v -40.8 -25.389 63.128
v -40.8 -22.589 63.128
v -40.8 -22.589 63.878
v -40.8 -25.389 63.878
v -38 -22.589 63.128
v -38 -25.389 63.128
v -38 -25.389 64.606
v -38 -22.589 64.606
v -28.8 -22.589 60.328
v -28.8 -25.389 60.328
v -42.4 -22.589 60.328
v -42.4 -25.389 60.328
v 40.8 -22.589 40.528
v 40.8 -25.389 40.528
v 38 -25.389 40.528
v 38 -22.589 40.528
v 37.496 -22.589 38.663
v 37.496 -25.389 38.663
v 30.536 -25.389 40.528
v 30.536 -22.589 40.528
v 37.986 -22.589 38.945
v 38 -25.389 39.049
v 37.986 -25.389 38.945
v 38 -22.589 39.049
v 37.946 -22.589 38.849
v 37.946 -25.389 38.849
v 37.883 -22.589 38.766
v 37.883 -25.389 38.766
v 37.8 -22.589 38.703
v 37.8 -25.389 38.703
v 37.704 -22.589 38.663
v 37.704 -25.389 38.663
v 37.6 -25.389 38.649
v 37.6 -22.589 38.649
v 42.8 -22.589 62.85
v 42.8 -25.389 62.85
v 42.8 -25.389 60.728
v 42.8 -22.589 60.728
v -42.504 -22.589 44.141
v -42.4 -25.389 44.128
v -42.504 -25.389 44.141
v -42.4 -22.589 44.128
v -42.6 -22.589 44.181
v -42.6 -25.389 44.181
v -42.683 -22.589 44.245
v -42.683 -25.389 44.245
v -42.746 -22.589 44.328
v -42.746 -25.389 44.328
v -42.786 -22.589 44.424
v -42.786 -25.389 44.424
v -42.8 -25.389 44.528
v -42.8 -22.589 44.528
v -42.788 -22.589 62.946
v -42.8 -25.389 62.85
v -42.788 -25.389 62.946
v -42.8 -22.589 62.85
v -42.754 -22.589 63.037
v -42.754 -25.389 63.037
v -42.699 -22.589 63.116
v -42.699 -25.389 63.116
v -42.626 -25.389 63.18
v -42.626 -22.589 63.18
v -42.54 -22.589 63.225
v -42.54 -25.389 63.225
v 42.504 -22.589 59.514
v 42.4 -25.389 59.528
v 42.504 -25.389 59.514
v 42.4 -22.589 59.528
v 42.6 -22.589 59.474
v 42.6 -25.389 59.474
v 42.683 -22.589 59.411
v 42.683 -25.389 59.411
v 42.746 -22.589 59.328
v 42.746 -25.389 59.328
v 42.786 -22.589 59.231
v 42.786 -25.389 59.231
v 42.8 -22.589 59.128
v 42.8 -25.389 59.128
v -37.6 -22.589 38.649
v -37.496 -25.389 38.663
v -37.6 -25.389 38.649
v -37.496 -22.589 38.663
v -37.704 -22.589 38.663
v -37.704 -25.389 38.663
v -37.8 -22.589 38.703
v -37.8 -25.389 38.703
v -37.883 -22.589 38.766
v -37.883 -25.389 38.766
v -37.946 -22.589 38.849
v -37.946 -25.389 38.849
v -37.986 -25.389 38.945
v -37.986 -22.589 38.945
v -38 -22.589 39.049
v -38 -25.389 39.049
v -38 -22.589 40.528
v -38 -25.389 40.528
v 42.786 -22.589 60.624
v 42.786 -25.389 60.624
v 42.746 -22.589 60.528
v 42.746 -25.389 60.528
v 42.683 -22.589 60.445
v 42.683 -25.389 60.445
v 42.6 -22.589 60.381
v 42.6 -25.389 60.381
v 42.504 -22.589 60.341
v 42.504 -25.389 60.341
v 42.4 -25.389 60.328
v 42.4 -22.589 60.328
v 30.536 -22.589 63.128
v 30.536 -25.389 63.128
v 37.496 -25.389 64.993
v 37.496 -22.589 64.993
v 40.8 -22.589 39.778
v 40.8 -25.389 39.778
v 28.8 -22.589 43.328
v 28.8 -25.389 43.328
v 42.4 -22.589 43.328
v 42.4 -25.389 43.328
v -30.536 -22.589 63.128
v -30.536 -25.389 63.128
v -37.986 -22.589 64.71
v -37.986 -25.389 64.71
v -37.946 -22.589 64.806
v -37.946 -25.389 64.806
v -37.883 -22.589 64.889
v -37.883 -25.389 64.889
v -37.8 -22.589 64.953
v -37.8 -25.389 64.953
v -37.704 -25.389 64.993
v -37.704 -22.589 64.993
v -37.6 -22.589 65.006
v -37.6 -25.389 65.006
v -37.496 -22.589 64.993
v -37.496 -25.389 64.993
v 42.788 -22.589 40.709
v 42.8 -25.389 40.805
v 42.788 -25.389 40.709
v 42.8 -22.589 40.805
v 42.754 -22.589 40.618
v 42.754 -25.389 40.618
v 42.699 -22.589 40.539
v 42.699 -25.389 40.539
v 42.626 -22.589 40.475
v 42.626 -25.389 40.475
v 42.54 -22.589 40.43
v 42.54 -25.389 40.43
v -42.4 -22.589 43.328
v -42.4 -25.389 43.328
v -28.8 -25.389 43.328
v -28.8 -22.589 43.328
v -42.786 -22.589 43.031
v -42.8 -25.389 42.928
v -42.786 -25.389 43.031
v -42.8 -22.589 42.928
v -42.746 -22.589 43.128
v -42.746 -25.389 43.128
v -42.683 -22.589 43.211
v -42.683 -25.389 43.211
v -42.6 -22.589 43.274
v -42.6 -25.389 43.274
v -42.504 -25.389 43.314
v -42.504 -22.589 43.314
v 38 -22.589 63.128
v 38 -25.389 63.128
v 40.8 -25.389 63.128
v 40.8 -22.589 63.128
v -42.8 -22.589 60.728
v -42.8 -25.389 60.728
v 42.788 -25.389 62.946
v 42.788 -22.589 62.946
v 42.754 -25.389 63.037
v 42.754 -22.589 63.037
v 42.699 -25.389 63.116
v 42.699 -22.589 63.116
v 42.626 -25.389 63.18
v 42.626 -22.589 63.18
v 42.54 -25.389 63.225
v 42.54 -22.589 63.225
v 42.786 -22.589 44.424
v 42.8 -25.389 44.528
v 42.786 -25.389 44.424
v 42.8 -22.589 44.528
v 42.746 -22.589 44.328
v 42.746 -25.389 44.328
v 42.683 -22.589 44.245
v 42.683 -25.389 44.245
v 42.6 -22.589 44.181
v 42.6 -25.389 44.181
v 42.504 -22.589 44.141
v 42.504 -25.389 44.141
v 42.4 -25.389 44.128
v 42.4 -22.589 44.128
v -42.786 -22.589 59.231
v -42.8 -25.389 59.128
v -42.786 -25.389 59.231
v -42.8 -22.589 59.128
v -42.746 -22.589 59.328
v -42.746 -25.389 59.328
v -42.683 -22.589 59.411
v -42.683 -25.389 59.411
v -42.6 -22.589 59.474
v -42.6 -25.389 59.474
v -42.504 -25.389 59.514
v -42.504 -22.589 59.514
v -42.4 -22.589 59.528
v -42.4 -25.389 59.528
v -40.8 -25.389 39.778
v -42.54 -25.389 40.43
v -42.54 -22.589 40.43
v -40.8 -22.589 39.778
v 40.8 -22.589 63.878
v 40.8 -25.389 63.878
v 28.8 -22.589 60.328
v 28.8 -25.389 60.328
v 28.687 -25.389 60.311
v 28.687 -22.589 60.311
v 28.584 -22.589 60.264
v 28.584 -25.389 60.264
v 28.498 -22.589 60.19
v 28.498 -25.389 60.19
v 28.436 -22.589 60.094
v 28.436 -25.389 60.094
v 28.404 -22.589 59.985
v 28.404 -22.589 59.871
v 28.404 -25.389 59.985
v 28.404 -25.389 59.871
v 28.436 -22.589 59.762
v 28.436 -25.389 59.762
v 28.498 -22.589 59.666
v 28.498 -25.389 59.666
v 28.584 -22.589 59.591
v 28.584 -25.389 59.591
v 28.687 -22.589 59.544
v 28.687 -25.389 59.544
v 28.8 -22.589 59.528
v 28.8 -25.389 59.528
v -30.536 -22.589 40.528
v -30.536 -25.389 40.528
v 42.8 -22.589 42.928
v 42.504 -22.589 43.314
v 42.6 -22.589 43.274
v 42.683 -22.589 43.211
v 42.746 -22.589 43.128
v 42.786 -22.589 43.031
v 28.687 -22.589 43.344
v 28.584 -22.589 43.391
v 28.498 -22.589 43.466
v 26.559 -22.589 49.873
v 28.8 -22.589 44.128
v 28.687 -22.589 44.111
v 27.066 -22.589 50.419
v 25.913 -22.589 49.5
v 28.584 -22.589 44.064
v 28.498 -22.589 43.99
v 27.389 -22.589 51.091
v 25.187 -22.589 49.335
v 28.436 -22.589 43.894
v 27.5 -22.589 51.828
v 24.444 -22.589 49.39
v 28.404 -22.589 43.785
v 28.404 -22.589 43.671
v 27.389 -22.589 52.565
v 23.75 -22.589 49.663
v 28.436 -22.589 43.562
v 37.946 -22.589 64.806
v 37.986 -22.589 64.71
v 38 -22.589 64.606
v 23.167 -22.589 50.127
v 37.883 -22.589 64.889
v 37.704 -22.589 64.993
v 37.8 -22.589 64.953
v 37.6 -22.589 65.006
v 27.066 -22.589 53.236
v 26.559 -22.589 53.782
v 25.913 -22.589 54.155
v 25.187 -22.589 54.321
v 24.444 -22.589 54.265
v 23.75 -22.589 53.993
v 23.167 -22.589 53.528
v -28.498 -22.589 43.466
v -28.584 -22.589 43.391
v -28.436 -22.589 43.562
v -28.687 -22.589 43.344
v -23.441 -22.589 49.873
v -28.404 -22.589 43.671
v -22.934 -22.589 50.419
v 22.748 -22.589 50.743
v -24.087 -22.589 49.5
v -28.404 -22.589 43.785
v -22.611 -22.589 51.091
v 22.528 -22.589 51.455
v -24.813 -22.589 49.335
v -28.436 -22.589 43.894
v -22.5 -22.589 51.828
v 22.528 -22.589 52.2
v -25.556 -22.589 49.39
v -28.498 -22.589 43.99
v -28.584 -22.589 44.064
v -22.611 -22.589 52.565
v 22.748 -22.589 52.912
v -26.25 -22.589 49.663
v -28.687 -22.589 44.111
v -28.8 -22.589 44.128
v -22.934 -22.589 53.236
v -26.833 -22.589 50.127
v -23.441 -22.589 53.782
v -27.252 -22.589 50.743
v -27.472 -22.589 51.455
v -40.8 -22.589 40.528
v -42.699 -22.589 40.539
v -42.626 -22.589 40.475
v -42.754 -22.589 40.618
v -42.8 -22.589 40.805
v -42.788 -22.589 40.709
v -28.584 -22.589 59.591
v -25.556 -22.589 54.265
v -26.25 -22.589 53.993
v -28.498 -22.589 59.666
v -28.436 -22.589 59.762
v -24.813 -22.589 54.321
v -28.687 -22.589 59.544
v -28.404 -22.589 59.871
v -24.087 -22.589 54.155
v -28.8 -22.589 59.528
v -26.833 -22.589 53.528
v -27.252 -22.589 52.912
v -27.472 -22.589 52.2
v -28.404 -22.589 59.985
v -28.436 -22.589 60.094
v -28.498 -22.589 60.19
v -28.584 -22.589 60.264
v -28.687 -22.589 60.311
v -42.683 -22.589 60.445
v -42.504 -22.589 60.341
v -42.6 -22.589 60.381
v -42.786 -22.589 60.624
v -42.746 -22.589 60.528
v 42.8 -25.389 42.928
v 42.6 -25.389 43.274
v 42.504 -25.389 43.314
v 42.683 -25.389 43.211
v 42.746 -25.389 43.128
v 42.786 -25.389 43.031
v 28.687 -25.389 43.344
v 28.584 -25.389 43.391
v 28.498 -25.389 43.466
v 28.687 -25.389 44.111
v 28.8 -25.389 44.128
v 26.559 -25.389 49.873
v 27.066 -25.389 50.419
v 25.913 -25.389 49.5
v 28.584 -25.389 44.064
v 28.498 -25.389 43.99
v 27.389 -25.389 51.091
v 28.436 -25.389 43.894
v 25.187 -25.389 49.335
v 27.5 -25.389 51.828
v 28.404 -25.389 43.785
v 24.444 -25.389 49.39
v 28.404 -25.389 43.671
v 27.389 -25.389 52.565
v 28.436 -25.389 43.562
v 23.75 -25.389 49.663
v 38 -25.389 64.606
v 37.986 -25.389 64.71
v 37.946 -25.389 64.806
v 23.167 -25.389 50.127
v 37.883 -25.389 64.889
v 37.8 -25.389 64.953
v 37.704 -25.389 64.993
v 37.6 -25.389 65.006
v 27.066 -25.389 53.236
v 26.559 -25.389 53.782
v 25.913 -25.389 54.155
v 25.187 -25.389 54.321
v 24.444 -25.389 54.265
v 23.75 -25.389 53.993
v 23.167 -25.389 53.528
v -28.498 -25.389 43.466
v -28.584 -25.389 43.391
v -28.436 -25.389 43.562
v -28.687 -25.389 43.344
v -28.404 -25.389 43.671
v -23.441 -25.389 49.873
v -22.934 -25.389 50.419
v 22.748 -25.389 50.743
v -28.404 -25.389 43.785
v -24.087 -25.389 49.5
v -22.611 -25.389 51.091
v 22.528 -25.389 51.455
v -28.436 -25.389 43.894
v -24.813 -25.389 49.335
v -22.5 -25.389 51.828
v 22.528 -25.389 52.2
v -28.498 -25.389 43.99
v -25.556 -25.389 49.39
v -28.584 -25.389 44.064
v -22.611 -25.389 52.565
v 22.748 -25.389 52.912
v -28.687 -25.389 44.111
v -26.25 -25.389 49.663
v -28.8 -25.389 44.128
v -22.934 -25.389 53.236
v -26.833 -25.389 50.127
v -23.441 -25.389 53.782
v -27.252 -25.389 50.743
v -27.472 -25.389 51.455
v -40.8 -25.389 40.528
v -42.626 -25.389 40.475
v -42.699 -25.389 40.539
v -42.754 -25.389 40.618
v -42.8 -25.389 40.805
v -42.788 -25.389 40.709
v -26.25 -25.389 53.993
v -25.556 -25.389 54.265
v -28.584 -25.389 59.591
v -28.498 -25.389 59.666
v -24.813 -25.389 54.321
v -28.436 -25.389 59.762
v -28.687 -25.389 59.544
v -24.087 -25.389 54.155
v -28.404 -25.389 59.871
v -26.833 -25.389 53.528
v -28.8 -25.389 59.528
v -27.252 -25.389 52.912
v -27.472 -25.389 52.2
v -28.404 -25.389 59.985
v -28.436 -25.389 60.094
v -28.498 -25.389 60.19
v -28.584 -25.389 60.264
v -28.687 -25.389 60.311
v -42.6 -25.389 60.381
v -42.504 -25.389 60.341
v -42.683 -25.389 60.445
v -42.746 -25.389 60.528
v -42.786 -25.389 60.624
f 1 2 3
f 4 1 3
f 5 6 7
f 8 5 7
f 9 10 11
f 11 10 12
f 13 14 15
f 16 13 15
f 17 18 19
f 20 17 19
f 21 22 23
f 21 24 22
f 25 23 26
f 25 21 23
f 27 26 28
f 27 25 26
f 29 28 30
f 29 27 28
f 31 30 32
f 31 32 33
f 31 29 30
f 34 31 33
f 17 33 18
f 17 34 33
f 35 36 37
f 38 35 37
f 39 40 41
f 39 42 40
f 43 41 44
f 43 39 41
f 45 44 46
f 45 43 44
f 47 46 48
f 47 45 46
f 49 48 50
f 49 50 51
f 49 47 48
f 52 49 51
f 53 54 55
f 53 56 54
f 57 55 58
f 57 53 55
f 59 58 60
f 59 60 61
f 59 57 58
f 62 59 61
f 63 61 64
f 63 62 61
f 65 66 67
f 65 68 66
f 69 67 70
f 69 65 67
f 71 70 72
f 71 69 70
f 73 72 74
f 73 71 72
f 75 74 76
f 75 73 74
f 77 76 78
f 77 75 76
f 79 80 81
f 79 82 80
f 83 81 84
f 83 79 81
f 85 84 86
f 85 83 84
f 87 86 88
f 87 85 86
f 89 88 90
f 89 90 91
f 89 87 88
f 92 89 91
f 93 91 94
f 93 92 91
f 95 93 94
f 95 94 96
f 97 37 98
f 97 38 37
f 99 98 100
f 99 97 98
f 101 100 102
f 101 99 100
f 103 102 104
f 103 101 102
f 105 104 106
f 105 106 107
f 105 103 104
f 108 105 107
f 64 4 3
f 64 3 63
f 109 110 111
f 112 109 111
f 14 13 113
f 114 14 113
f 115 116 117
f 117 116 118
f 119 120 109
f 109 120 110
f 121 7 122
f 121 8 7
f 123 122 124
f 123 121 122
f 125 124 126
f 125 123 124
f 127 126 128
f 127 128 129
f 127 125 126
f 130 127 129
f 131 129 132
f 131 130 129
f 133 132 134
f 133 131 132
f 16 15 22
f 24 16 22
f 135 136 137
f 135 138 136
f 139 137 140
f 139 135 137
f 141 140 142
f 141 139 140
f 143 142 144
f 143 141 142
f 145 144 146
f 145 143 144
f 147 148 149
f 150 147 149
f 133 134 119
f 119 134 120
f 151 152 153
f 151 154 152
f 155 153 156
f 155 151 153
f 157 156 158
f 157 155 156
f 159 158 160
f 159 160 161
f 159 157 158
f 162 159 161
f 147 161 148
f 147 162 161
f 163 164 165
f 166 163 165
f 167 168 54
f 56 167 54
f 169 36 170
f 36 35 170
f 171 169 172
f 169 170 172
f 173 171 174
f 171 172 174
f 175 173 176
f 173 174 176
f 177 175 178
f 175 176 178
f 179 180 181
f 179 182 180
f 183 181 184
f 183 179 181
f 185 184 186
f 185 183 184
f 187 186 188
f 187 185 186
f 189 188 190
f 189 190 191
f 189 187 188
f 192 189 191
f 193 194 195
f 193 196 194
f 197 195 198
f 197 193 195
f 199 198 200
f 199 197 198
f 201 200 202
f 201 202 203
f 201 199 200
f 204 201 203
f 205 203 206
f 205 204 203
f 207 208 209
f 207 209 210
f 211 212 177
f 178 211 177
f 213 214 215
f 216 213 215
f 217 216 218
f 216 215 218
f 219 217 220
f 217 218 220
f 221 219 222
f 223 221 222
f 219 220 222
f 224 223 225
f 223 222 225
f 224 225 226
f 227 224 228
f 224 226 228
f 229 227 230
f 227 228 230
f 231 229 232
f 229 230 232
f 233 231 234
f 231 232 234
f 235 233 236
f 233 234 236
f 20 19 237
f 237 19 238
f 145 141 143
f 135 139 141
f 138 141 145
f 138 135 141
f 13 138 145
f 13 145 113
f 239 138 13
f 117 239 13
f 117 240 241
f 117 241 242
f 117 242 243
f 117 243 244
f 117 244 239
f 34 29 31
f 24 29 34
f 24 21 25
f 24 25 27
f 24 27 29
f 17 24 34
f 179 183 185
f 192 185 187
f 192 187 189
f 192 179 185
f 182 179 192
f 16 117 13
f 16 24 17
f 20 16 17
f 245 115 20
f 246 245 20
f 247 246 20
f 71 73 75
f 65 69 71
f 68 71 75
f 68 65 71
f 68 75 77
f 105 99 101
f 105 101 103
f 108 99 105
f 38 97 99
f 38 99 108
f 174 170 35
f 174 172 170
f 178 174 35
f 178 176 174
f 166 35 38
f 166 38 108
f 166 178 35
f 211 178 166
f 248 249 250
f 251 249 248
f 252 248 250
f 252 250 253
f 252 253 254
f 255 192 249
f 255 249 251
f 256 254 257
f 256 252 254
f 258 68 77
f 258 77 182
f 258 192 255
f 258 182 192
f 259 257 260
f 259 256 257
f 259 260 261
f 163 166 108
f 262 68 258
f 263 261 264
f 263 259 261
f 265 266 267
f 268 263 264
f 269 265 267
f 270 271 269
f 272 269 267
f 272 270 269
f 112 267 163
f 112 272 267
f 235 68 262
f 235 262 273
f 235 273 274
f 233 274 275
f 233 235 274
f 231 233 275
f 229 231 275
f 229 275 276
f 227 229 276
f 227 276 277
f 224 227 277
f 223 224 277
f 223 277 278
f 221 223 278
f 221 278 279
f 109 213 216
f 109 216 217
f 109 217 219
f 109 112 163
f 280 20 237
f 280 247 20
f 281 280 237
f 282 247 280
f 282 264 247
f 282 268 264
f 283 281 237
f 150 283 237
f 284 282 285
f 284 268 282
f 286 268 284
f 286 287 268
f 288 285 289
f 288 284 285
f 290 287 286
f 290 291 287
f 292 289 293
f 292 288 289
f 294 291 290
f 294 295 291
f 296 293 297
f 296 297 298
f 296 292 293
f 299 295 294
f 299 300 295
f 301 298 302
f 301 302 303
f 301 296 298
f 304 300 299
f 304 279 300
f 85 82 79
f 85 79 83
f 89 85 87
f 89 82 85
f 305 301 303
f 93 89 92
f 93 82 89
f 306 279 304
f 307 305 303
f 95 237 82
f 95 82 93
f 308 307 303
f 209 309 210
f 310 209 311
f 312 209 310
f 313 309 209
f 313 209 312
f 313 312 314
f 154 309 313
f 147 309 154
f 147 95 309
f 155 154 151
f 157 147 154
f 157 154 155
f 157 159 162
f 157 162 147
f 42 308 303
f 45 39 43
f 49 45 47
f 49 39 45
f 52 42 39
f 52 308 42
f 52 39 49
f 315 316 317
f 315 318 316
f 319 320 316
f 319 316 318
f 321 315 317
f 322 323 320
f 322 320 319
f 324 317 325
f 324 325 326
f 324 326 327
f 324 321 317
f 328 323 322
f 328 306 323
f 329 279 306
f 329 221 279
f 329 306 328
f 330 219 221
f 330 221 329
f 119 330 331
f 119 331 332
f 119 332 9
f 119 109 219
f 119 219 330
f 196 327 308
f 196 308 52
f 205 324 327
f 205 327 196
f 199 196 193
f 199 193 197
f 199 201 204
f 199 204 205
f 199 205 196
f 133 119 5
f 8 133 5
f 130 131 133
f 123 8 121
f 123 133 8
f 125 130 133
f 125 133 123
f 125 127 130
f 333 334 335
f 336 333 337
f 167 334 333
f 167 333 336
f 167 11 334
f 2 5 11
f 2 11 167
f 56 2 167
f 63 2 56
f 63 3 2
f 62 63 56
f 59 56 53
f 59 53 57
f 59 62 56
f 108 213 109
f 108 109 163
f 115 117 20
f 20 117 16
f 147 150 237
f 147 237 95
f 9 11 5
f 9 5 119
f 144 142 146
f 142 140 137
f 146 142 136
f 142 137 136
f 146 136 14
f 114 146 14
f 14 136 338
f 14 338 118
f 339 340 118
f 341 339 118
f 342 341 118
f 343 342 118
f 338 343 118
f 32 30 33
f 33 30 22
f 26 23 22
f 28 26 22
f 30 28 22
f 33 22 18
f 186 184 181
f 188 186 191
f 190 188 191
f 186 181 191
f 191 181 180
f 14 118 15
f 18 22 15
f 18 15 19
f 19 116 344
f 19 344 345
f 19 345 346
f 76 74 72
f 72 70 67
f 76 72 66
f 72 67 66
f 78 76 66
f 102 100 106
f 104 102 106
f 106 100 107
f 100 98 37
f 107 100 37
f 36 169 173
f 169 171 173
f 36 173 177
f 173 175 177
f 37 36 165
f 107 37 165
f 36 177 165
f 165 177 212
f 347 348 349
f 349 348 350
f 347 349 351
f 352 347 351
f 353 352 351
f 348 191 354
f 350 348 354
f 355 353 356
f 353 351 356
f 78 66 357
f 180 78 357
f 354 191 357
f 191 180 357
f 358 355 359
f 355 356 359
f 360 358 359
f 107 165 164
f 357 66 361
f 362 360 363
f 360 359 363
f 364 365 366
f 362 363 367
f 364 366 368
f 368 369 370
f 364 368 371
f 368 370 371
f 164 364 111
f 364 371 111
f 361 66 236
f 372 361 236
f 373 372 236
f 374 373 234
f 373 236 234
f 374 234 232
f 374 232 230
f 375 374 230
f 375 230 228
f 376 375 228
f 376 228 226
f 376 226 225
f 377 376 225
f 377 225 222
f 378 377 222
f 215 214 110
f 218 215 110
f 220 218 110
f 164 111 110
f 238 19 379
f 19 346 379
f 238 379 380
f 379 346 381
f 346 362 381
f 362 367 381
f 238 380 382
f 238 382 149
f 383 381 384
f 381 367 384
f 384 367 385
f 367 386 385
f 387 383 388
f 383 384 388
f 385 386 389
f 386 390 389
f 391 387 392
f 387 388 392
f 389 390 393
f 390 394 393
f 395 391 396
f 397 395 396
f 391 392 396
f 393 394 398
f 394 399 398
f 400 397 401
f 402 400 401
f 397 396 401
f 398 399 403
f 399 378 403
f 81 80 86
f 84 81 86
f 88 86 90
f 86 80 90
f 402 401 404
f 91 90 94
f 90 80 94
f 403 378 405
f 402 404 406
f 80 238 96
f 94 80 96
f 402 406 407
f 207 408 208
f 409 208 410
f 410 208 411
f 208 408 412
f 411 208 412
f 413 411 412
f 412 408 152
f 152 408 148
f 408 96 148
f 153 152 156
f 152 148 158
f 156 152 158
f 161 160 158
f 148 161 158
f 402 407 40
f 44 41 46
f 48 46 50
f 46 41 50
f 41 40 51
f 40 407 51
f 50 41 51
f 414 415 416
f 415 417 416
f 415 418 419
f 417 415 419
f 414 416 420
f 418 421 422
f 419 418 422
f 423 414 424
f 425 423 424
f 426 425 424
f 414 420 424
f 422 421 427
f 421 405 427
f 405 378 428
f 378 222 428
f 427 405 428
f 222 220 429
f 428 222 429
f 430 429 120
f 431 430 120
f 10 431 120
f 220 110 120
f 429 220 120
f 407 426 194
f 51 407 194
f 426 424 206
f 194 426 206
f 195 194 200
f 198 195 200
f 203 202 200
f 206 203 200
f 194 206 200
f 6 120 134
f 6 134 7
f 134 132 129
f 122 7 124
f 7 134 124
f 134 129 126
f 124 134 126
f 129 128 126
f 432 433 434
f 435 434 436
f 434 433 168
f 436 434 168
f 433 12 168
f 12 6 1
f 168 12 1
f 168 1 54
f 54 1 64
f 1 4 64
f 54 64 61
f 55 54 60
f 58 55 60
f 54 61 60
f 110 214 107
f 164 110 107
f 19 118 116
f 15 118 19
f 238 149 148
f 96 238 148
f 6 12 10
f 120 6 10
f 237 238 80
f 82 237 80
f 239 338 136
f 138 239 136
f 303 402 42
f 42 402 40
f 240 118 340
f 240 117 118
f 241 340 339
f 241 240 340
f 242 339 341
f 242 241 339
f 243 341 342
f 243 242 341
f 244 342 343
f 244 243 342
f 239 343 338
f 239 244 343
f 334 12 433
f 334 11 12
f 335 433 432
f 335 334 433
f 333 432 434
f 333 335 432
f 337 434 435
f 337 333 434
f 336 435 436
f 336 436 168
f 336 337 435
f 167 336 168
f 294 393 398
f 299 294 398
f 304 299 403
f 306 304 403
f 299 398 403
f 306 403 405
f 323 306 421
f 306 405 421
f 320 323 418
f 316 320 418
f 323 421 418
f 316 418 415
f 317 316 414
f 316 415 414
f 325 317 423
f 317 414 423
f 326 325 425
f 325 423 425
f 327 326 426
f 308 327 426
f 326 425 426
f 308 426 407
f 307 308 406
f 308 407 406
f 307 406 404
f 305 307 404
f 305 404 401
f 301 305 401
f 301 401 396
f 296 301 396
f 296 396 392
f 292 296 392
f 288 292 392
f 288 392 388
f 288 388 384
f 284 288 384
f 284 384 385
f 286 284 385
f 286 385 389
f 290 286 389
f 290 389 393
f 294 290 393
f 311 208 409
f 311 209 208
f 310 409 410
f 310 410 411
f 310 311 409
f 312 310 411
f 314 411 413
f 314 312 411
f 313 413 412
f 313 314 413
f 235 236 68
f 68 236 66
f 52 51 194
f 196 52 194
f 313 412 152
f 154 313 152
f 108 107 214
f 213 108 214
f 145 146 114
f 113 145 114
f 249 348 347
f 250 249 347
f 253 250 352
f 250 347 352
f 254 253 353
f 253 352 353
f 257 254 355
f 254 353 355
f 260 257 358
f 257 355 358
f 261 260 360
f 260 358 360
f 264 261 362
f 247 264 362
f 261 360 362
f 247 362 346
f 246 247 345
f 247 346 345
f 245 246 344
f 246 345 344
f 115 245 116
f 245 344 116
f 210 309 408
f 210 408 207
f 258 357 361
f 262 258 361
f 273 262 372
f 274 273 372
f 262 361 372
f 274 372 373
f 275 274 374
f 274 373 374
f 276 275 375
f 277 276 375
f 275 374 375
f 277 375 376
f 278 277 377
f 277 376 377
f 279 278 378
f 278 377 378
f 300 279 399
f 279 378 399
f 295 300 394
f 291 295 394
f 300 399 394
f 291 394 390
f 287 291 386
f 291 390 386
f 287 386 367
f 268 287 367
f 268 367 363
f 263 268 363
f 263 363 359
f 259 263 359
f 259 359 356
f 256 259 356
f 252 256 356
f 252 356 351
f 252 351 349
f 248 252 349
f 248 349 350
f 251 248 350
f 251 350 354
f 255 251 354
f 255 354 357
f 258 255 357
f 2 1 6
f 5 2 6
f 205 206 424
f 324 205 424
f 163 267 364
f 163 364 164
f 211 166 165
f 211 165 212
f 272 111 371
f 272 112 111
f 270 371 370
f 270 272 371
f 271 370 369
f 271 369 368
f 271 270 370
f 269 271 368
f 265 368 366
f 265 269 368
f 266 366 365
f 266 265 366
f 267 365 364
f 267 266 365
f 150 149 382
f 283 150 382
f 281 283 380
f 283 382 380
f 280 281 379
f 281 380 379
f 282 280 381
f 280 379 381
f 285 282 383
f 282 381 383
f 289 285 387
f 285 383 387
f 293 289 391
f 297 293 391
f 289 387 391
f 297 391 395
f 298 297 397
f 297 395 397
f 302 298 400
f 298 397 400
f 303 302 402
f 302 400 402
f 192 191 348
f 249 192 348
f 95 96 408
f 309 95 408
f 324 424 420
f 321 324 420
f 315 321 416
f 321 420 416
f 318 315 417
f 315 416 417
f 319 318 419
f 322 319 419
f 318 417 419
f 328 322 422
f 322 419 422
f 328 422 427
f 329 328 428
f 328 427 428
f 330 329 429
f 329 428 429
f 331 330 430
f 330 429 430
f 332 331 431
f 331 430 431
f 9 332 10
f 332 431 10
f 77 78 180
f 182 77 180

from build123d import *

# Parameters (mm, degrees)
PAD010_DEPTH    = 2.8
FILLET003_R     = 0.4
SKETCH016_R     = 2.5
POCKET003_DEPTH = 2.801


with BuildPart() as part:
    # Sketch010 (on Face2 of ShapeBinder009) → Pad010 (new body)
    with BuildSketch(Plane.XZ.offset(25.388718)):
        with BuildLine():
            Line((42.8, 63.127675), (42.8, 60.327675))
            Line((42.8, 60.327675), (28.8, 60.327675))
            ThreePointArc((28.8, 60.327675), (28.4, 59.927675), (28.8, 59.527675))
            Line((28.8, 59.527675), (42.8, 59.527675))
            Line((42.8, 59.527675), (42.8, 44.127675))
            Line((42.8, 44.127675), (28.8, 44.127675))
            ThreePointArc((28.8, 44.127675), (28.4, 43.727675), (28.8, 43.327675))
            Line((28.8, 43.327675), (42.8, 43.327675))
            Line((42.8, 43.327675), (42.8, 40.527675))
            Line((42.8, 40.527675), (40.8, 39.777675))
            Line((40.8, 40.527675), (40.8, 39.777675))
            Line((40.8, 40.527675), (38, 40.527675))
            Line((38, 40.527675), (38, 38.527675))
            Line((38, 38.527675), (30.535898, 40.527675))
            Line((30.535898, 40.527675), (-30.535898, 40.527675))
            Line((-30.535898, 40.527675), (-38, 38.527675))
            Line((-38, 38.527675), (-38, 40.527675))
            Line((-38, 40.527675), (-40.8, 40.527675))
            Line((-40.8, 40.527675), (-40.8, 39.777675))
            Line((-42.8, 40.527675), (-40.8, 39.777675))
            Line((-42.8, 40.527675), (-42.8, 43.327675))
            Line((-42.8, 43.327675), (-28.8, 43.327675))
            ThreePointArc((-28.8, 43.327675), (-28.4, 43.727675), (-28.8, 44.127675))
            Line((-28.8, 44.127675), (-42.8, 44.127675))
            Line((-42.8, 44.127675), (-42.8, 59.527675))
            Line((-42.8, 59.527675), (-28.8, 59.527675))
            ThreePointArc((-28.8, 59.527675), (-28.4, 59.927675), (-28.8, 60.327675))
            Line((-28.8, 60.327675), (-42.8, 60.327675))
            Line((-42.8, 60.327675), (-42.8, 63.127675))
            Line((-40.8, 63.877675), (-42.8, 63.127675))
            Line((-40.8, 63.127675), (-40.8, 63.877675))
            Line((-40.8, 63.127675), (-38, 63.127675))
            Line((-38, 63.127675), (-38, 65.127675))
            Line((-38, 65.127675), (-30.535898, 63.127675))
            Line((-30.535898, 63.127675), (30.535898, 63.127675))
            Line((30.535898, 63.127675), (38, 65.127675))
            Line((38, 65.127675), (38, 63.127675))
            Line((38, 63.127675), (40.8, 63.127675))
            Line((40.8, 63.127675), (40.8, 63.877675))
            Line((40.8, 63.877675), (42.8, 63.127675))
        make_face()
    extrude(amount=-PAD010_DEPTH)

    # Fillet003
    fillet003_edges = [part.edges().sort_by_distance(p)[0] for p in [
        (-42.8, -23.988718, 60.327675),
        (-42.8, -23.988718, 63.127675),
        (-42.8, -23.988718, 59.527675),
        (-38, -23.988718, 65.127675),
        (38, -23.988718, 65.127675),
        (42.8, -23.988718, 63.127675),
        (42.8, -23.988718, 60.327675),
        (42.8, -23.988718, 59.527675),
        (42.8, -23.988718, 44.127675),
        (42.8, -23.988718, 43.327675),
        (42.8, -23.988718, 40.527675),
        (38, -23.988718, 38.527675),
        (-42.8, -23.988718, 44.127675),
        (-42.8, -23.988718, 43.327675),
        (-42.8, -23.988718, 40.527675),
        (-38, -23.988718, 38.527675),
    ]]
    fillet(fillet003_edges, radius=FILLET003_R)

    # Sketch016 (on Face2 of Fillet003) → Pocket003 (cut, through all)
    with BuildSketch(Plane.XZ.offset(25.388718)):
        with Locations((-25, 51.827675)):
            Circle(SKETCH016_R)
        with Locations((25, 51.827675)):
            Circle(SKETCH016_R)
    extrude(amount=-POCKET003_DEPTH, mode=Mode.SUBTRACT)


solid = part.part
